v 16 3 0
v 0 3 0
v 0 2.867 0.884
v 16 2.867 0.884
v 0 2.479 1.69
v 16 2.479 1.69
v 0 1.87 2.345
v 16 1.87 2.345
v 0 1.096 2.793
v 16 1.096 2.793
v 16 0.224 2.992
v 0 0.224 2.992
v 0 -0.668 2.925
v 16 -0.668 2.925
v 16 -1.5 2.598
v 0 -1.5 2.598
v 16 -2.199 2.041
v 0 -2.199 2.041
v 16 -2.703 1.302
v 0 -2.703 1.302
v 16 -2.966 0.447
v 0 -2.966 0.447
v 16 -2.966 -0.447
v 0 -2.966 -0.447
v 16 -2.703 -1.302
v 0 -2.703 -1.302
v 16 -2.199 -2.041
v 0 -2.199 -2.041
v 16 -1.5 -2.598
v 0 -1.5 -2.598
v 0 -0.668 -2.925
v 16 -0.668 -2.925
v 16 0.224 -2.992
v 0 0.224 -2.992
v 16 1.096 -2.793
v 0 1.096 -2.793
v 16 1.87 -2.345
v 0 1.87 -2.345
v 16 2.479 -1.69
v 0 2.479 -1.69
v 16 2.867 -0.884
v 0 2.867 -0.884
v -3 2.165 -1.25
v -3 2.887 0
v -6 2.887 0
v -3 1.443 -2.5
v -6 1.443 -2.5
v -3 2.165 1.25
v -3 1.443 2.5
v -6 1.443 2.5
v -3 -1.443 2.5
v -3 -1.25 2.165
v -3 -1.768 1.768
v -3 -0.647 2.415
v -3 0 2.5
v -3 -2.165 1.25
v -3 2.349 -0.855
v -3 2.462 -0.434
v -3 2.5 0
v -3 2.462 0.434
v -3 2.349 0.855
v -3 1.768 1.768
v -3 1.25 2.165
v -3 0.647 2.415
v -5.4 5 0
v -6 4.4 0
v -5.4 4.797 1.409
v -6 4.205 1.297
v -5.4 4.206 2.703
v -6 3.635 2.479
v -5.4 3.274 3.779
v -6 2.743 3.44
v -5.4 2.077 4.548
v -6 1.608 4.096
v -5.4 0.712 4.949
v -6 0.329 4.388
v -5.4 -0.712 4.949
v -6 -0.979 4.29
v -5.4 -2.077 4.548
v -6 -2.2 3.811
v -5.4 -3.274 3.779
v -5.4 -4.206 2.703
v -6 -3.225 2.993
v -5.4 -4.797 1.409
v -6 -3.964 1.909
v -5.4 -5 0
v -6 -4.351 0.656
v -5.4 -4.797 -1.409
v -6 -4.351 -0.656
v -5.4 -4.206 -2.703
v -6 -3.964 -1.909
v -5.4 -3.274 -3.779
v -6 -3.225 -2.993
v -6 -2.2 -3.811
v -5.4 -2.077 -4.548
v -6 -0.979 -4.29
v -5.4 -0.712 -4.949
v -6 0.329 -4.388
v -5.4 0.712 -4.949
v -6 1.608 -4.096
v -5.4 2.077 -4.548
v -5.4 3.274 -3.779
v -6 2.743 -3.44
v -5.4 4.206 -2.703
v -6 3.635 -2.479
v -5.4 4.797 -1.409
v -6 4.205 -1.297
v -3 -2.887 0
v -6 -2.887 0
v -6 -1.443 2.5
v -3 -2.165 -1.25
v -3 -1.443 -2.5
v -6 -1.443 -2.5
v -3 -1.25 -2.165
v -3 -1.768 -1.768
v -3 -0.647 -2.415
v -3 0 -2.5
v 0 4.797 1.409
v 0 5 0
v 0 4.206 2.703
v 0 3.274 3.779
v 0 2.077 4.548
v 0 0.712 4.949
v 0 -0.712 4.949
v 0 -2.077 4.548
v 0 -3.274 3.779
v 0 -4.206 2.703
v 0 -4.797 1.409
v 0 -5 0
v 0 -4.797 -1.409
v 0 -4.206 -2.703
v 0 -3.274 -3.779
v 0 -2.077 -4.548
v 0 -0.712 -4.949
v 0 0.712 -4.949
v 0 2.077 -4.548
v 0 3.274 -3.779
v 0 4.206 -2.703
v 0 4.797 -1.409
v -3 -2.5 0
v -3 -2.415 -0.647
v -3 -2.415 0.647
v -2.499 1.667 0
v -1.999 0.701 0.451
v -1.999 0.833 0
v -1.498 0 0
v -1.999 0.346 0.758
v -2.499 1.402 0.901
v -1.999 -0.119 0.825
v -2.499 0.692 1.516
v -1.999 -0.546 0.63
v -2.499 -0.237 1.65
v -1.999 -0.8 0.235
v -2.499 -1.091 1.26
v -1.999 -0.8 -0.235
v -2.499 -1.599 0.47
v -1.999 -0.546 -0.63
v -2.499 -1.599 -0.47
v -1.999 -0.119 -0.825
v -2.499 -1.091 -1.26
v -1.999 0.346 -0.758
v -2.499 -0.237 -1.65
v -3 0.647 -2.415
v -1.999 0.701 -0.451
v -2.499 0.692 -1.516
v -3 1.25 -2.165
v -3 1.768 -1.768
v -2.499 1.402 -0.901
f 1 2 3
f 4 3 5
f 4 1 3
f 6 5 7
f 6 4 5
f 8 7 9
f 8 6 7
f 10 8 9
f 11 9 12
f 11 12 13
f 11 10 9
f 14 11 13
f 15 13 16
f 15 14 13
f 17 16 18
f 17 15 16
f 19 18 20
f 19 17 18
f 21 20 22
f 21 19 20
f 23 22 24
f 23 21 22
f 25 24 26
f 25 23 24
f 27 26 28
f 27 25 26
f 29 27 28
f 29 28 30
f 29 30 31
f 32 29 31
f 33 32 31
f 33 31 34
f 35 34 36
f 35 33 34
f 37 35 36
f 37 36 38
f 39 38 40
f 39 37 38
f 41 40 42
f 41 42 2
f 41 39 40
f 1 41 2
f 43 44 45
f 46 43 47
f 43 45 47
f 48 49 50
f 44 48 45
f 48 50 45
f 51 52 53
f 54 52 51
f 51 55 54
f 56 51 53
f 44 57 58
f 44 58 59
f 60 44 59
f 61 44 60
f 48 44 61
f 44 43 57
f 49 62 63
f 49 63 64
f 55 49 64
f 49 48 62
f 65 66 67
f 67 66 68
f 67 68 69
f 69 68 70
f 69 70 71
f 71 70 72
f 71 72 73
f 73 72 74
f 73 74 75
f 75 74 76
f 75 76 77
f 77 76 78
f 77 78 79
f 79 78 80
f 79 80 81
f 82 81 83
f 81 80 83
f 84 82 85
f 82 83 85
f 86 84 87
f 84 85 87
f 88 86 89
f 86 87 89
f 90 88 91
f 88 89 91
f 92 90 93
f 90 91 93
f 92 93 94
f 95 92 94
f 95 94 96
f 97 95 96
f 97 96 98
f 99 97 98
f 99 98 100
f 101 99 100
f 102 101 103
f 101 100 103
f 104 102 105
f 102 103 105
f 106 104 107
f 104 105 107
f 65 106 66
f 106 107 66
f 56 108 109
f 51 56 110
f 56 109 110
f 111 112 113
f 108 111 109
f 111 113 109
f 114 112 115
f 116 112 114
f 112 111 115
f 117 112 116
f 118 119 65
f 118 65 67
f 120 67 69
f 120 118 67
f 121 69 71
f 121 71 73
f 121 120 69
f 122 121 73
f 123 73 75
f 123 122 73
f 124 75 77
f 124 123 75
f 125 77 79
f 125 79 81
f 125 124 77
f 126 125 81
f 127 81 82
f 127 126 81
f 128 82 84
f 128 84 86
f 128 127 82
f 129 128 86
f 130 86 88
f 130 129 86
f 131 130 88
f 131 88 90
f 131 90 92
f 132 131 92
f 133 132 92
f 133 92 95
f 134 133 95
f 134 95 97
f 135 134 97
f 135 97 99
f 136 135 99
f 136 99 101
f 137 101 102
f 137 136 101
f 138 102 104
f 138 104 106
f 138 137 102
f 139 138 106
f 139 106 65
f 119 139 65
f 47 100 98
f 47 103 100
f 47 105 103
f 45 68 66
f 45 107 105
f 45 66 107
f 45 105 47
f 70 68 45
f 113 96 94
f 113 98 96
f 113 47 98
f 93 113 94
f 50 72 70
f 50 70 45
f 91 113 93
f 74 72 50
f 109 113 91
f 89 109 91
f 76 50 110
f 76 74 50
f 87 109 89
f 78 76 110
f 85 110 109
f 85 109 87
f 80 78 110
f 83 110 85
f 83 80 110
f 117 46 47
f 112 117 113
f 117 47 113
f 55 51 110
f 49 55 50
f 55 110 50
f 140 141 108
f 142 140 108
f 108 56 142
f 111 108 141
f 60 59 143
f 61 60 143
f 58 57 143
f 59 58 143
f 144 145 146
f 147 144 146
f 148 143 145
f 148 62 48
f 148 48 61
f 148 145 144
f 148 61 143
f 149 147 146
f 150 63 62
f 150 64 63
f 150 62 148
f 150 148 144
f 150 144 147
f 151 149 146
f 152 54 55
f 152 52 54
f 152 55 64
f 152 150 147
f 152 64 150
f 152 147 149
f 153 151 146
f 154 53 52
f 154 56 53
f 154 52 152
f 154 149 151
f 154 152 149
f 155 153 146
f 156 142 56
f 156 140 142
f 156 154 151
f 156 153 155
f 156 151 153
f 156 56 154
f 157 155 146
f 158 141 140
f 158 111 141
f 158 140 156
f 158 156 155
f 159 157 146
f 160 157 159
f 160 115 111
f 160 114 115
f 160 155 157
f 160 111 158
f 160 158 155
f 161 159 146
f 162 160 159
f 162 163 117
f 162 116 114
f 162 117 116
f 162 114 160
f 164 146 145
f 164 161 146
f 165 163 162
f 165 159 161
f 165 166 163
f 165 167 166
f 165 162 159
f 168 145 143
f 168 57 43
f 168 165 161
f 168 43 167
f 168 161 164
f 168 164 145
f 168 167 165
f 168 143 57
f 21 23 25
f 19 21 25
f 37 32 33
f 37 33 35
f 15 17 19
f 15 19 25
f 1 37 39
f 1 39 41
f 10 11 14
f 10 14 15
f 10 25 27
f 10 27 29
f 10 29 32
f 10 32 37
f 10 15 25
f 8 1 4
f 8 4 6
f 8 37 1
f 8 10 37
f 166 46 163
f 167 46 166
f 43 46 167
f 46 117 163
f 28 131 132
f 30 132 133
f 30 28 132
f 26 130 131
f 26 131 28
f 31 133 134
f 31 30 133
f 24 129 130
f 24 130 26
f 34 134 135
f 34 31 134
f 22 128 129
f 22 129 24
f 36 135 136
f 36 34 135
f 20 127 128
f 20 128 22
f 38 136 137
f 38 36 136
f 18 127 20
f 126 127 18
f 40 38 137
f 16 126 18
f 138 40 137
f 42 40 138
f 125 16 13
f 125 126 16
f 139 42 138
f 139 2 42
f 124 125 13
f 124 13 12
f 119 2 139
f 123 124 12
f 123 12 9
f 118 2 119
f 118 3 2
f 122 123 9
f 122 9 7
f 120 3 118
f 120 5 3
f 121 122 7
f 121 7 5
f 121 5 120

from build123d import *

# Parameters (mm, degrees)
CUT_EXTRUDE1_DEPTH = 3
CHAMFER1_SIZE      = 0.6


with BuildPart() as part:
    # Sketch1 → Revolve1 (revolve)
    with BuildSketch(Plane.XY):
        Polygon((0, 3), (16, 3), (16, 0), (-6, 0), (-6, 5), (0, 5), align=None)
    revolve(axis=Axis((-6, 0, 0), (1, 0, 0)))

    # Sketch2 → Cut-Revolve1 (revolve, cut)
    with BuildSketch(Plane.XY):
        Polygon((-1.497848452, 0), (-3, 2.5), (-6, 2.5), (-6, 0), align=None)
    revolve(axis=Axis((-6, 0, 0), (1, 0, 0)), mode=Mode.SUBTRACT)

    # Sketch3 → Cut-Extrude1 (cut)
    with BuildSketch(Plane.ZY.offset(6)):
        Polygon((2.5, 1.443375673), (0, 2.886751346), (-2.5, 1.443375673), (-2.5, -1.443375673), (0, -2.886751346), (2.5, -1.443375673), align=None)
    extrude(amount=-CUT_EXTRUDE1_DEPTH, mode=Mode.SUBTRACT)

    # Chamfer1
    chamfer1_edges = [part.edges().sort_by_distance(p)[0] for p in [
        (-6, -5, 0),
    ]]
    chamfer(chamfer1_edges, length=CHAMFER1_SIZE)


solid = part.part
